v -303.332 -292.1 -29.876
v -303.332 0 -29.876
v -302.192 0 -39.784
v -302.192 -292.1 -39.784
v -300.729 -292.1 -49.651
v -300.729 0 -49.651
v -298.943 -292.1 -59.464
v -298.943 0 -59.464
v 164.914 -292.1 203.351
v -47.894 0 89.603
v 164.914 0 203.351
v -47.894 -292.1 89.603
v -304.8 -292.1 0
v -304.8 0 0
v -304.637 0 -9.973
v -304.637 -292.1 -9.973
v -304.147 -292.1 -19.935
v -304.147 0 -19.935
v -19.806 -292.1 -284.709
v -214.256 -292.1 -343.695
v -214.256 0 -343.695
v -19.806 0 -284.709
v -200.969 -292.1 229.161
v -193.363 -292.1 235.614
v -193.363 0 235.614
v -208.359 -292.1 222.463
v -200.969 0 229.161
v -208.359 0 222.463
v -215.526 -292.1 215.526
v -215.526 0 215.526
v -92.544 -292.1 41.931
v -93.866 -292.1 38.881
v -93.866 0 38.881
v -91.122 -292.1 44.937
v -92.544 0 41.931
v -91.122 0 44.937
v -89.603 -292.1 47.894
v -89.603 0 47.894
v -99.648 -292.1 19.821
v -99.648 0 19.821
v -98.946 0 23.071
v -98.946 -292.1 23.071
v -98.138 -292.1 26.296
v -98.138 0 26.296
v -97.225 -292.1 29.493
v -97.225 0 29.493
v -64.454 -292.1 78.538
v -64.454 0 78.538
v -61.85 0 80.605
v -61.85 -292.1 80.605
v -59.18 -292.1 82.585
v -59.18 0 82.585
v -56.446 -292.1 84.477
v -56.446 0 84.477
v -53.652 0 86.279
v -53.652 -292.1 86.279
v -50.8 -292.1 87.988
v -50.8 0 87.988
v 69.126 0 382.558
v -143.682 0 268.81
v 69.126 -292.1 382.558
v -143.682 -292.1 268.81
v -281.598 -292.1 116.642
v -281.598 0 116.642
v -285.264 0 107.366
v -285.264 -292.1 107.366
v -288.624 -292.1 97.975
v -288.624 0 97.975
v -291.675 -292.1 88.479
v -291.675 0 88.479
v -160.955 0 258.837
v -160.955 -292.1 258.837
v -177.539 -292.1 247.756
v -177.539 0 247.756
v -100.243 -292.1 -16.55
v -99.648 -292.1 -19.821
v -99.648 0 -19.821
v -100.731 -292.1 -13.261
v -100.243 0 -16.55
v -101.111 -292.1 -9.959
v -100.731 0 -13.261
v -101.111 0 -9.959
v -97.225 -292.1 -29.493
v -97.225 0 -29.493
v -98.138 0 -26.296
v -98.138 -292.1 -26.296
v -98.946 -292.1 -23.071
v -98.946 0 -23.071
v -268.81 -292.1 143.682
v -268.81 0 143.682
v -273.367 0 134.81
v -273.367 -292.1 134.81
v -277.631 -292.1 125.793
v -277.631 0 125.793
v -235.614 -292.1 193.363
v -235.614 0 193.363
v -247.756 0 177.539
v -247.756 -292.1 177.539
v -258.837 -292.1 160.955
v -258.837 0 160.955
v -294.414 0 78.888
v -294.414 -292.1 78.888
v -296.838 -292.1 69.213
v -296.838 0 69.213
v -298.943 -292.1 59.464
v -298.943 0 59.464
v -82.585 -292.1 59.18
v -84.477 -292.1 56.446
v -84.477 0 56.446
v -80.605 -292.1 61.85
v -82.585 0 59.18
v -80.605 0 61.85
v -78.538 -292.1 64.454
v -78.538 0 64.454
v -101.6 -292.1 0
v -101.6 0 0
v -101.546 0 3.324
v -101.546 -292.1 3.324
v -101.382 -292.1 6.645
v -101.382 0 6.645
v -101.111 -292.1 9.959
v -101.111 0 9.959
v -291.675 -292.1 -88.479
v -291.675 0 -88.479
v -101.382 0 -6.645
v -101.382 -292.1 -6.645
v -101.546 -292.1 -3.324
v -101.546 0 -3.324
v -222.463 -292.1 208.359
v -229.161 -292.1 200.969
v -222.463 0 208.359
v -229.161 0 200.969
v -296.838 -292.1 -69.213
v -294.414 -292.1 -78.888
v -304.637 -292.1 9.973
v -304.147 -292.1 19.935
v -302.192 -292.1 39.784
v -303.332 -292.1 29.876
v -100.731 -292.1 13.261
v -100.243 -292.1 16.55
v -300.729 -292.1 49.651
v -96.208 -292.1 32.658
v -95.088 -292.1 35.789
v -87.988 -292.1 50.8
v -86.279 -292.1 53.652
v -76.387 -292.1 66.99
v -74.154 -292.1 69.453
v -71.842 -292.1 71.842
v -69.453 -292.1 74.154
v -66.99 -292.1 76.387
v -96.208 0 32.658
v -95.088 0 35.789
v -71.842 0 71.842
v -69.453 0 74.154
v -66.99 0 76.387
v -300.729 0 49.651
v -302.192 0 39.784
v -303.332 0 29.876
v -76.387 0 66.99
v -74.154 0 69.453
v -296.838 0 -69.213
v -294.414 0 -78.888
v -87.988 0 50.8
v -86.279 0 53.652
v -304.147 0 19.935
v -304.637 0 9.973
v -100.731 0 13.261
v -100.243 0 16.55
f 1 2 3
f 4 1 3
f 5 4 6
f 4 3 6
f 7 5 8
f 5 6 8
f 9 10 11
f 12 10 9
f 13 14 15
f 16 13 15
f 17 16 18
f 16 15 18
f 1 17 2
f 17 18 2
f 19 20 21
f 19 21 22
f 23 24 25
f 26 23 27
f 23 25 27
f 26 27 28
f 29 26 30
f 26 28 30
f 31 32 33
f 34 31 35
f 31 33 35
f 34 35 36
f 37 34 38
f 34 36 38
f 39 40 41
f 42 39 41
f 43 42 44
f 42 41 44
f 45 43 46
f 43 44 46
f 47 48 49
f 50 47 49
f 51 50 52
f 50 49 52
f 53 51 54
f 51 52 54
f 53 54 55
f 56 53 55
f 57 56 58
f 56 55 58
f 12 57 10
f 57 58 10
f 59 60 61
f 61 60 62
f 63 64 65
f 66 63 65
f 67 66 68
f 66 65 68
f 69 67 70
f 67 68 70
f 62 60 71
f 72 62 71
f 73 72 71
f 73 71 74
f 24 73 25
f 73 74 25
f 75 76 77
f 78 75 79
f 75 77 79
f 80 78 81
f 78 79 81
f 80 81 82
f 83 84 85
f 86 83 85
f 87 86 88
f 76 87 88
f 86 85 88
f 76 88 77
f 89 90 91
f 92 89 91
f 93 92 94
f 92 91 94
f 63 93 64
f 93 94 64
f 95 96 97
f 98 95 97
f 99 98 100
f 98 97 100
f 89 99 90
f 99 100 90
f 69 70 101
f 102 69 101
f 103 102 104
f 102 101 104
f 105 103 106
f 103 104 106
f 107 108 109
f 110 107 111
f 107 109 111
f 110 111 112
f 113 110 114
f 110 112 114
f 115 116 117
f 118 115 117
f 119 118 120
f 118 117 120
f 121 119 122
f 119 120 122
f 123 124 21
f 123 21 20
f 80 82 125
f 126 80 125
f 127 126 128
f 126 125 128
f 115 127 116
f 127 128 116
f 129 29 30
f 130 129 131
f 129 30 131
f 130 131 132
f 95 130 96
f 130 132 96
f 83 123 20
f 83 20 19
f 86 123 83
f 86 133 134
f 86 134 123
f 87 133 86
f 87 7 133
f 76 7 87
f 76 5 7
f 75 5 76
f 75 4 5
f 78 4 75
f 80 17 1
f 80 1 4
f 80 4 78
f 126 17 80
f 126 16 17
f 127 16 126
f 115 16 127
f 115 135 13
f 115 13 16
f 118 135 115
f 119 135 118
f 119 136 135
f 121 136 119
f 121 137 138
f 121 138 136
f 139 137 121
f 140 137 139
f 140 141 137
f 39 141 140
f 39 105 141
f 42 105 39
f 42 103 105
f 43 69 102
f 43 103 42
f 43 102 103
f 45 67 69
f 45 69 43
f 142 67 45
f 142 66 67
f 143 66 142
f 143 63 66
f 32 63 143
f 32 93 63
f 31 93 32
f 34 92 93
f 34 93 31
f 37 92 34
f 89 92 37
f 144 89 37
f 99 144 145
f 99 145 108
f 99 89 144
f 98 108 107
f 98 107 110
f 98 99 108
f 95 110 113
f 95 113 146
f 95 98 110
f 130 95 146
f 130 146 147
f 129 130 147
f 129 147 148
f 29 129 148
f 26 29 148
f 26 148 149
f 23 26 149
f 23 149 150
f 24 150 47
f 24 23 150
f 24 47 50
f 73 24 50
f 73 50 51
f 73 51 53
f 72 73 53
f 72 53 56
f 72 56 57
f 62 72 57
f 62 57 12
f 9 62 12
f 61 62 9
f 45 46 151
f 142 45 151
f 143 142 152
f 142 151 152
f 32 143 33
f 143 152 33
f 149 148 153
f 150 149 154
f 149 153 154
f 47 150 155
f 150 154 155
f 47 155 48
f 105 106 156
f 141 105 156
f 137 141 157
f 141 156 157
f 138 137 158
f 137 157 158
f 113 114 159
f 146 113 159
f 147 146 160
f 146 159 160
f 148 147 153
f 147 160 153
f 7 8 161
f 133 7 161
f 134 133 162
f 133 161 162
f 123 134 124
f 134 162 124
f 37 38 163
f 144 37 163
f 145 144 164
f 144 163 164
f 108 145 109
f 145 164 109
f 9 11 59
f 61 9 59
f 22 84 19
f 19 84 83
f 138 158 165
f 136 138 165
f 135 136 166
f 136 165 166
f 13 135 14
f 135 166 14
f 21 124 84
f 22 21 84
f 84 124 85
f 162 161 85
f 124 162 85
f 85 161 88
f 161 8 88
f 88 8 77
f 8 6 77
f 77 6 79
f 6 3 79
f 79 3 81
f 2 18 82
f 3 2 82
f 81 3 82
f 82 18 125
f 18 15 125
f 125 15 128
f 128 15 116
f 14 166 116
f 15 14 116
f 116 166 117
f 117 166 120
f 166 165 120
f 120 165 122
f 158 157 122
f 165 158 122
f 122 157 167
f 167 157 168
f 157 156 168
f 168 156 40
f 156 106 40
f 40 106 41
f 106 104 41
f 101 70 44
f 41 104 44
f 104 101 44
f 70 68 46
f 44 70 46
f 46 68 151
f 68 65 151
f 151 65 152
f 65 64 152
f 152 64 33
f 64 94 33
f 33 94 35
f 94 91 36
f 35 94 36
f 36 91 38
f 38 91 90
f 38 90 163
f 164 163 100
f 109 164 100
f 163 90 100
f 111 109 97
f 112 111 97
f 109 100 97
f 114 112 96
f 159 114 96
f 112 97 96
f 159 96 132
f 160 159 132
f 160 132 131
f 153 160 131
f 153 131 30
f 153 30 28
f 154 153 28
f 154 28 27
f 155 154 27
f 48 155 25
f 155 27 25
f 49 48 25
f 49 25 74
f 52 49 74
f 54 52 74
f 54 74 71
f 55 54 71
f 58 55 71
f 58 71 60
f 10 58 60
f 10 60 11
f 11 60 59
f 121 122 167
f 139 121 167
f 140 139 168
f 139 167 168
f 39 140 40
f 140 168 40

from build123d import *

# Parameters (mm, degrees)
F1_DEPTH = 292.1
F3_DEPTH = 241.3
F4_W     = 203.2
F4_H     = 292.1
F5_DEPTH = 266.7


with BuildPart() as f1:
    # F0 (on Front) → F1 (new body)
    with BuildSketch(Plane.XZ):
        with BuildLine():
            Line((-169.3378070244, 253.4319378298), (-56.4459356748, 84.4773126099))
            ThreePointArc((-56.4459356748, 84.4773126099), (-52.23283881, 87.145226776), (-47.8939084615, 89.6032004578))
            Line((-47.8939084615, 89.6032004578), (-143.6817253846, 268.8096013734))
            ThreePointArc((-143.6817253846, 268.8096013734), (-156.6985164301, 261.4356803281), (-169.3378070244, 253.4319378298))
        make_face()
        with BuildLine():
            Line((-304.8, 0), (-101.6, 0))
            ThreePointArc((-101.6, 0), (-101.4776183504, 4.9852757117), (-101.1107682299, 9.9585414575))
            Line((-101.1107682299, 9.9585414575), (-303.3323046897, 29.8756243725))
            ThreePointArc((-303.3323046897, 29.8756243725), (-304.4328550513, 14.955827135), (-304.8, 0))
        make_face()
        with BuildLine():
            ThreePointArc((-101.1107682299, 9.9585414575), (-100.5003334124, 14.9078162047), (-99.647784489, 19.8211767168))
            Line((-99.647784489, 19.8211767168), (-298.9433534669, 59.4635301505))
            ThreePointArc((-298.9433534669, 59.4635301505), (-301.5010002373, 44.723448614), (-303.3323046897, 29.8756243725))
            Line((-303.3323046897, 29.8756243725), (-101.1107682299, 9.9585414575))
        make_face()
        with BuildLine():
            Line((-193.3630730131, 235.613586185), (-64.454357671, 78.5378620617))
            ThreePointArc((-64.454357671, 78.5378620617), (-60.5230493364, 81.6058851984), (-56.4459356748, 84.4773126099))
            Line((-56.4459356748, 84.4773126099), (-169.3378070244, 253.4319378298))
            ThreePointArc((-169.3378070244, 253.4319378298), (-181.5691480093, 244.8176555953), (-193.3630730131, 235.613586185))
        make_face()
        with BuildLine():
            Line((-303.3323046897, -29.8756243724), (-101.1107682299, -9.9585414575))
            ThreePointArc((-101.1107682299, -9.9585414575), (-101.4776183504, -4.9852757117), (-101.6, 0))
            Line((-101.6, 0), (-304.8, 0))
            ThreePointArc((-304.8, 0), (-304.4328550513, -14.955827135), (-303.3323046897, -29.8756243724))
        make_face()
        with BuildLine():
            Line((-215.5261469057, 215.5261469057), (-71.8420489686, 71.8420489686))
            ThreePointArc((-71.8420489686, 71.8420489686), (-68.2303898125, 75.2806343361), (-64.454357671, 78.5378620617))
            Line((-64.454357671, 78.5378620617), (-193.3630730131, 235.613586185))
            ThreePointArc((-193.3630730131, 235.613586185), (-204.6911694374, 225.8419030082), (-215.5261469057, 215.5261469057))
        make_face()
        with BuildLine():
            ThreePointArc((-99.647784489, -19.8211767168), (-100.5003334124, -14.9078162047), (-101.1107682299, -9.9585414575))
            Line((-101.1107682299, -9.9585414575), (-303.3323046897, -29.8756243724))
            ThreePointArc((-303.3323046897, -29.8756243724), (-301.5010002373, -44.723448614), (-298.9433534669, -59.4635301505))
            Line((-298.9433534669, -59.4635301505), (-99.647784489, -19.8211767168))
        make_face()
        with BuildLine():
            Line((-235.613586185, 193.3630730131), (-78.5378620617, 64.454357671))
            ThreePointArc((-78.5378620617, 64.454357671), (-75.2806343361, 68.2303898125), (-71.8420489686, 71.8420489686))
            Line((-71.8420489686, 71.8420489686), (-215.5261469057, 215.5261469057))
            ThreePointArc((-215.5261469057, 215.5261469057), (-225.8419030082, 204.6911694374), (-235.613586185, 193.3630730131))
        make_face()
        with BuildLine():
            Line((-291.6754143312, -88.4787696272), (-97.2251381104, -29.4929232091))
            ThreePointArc((-97.2251381104, -29.4929232091), (-98.5551753246, -24.6867862782), (-99.647784489, -19.8211767168))
            Line((-99.647784489, -19.8211767168), (-298.9433534669, -59.4635301505))
            ThreePointArc((-298.9433534669, -59.4635301505), (-295.6655259737, -74.0603588345), (-291.6754143312, -88.4787696272))
        make_face()
        with BuildLine():
            Line((-268.8096013734, 143.6817253846), (-89.6032004578, 47.8939084615))
            ThreePointArc((-89.6032004578, 47.8939084615), (-87.145226776, 52.23283881), (-84.4773126099, 56.4459356748))
            Line((-84.4773126099, 56.4459356748), (-253.4319378298, 169.3378070244))
            ThreePointArc((-253.4319378298, 169.3378070244), (-261.4356803281, 156.6985164301), (-268.8096013734, 143.6817253846))
        make_face()
        with BuildLine():
            Line((-281.5984815094, 116.6419101849), (-93.8661605031, 38.8806367283))
            ThreePointArc((-93.8661605031, 38.8806367283), (-91.8453121813, 43.4395974925), (-89.6032004578, 47.8939084615))
            Line((-89.6032004578, 47.8939084615), (-268.8096013734, 143.6817253846))
            ThreePointArc((-268.8096013734, 143.6817253846), (-275.535936544, 130.3187924776), (-281.5984815094, 116.6419101849))
        make_face()
        with BuildLine():
            ThreePointArc((-97.2251381104, 29.4929232091), (-95.6608770226, 34.2280091047), (-93.8661605031, 38.8806367283))
            Line((-93.8661605031, 38.8806367283), (-281.5984815094, 116.6419101849))
            ThreePointArc((-281.5984815094, 116.6419101849), (-286.9826310678, 102.6840273139), (-291.6754143312, 88.4787696272))
            Line((-291.6754143312, 88.4787696272), (-97.2251381104, 29.4929232091))
        make_face()
        with BuildLine():
            Line((-253.4319378298, 169.3378070244), (-84.4773126099, 56.4459356748))
            ThreePointArc((-84.4773126099, 56.4459356748), (-81.6058851984, 60.5230493364), (-78.5378620617, 64.454357671))
            Line((-78.5378620617, 64.454357671), (-235.613586185, 193.3630730131))
            ThreePointArc((-235.613586185, 193.3630730131), (-244.8176555953, 181.5691480093), (-253.4319378298, 169.3378070244))
        make_face()
        with BuildLine():
            Line((-298.9433534669, 59.4635301505), (-99.647784489, 19.8211767168))
            ThreePointArc((-99.647784489, 19.8211767168), (-98.5551753246, 24.6867862782), (-97.2251381104, 29.4929232091))
            Line((-97.2251381104, 29.4929232091), (-291.6754143312, 88.4787696272))
            ThreePointArc((-291.6754143312, 88.4787696272), (-295.6655259737, 74.0603588345), (-298.9433534669, 59.4635301505))
        make_face()
    extrude(amount=F1_DEPTH)

    # F3 (add): a face of the model
    f3_faces = [f1.faces().sort_by_distance(p)[0] for p in [
        (-95.787816923, -146.05, 179.2064009156),
    ]]
    extrude(f3_faces, amount=F3_DEPTH)

    # F4 (on face) → F5 (join)
    with BuildSketch(Plane(origin=(0, 0, 0), x_dir=(0.9569403357, 0, 0.2902846773), z_dir=(0.2902846773, 0, -0.9569403357))):
        with Locations((-203.2, 146.05)):
            Rectangle(F4_W, F4_H)
    extrude(amount=F5_DEPTH)


solid = f1.part
